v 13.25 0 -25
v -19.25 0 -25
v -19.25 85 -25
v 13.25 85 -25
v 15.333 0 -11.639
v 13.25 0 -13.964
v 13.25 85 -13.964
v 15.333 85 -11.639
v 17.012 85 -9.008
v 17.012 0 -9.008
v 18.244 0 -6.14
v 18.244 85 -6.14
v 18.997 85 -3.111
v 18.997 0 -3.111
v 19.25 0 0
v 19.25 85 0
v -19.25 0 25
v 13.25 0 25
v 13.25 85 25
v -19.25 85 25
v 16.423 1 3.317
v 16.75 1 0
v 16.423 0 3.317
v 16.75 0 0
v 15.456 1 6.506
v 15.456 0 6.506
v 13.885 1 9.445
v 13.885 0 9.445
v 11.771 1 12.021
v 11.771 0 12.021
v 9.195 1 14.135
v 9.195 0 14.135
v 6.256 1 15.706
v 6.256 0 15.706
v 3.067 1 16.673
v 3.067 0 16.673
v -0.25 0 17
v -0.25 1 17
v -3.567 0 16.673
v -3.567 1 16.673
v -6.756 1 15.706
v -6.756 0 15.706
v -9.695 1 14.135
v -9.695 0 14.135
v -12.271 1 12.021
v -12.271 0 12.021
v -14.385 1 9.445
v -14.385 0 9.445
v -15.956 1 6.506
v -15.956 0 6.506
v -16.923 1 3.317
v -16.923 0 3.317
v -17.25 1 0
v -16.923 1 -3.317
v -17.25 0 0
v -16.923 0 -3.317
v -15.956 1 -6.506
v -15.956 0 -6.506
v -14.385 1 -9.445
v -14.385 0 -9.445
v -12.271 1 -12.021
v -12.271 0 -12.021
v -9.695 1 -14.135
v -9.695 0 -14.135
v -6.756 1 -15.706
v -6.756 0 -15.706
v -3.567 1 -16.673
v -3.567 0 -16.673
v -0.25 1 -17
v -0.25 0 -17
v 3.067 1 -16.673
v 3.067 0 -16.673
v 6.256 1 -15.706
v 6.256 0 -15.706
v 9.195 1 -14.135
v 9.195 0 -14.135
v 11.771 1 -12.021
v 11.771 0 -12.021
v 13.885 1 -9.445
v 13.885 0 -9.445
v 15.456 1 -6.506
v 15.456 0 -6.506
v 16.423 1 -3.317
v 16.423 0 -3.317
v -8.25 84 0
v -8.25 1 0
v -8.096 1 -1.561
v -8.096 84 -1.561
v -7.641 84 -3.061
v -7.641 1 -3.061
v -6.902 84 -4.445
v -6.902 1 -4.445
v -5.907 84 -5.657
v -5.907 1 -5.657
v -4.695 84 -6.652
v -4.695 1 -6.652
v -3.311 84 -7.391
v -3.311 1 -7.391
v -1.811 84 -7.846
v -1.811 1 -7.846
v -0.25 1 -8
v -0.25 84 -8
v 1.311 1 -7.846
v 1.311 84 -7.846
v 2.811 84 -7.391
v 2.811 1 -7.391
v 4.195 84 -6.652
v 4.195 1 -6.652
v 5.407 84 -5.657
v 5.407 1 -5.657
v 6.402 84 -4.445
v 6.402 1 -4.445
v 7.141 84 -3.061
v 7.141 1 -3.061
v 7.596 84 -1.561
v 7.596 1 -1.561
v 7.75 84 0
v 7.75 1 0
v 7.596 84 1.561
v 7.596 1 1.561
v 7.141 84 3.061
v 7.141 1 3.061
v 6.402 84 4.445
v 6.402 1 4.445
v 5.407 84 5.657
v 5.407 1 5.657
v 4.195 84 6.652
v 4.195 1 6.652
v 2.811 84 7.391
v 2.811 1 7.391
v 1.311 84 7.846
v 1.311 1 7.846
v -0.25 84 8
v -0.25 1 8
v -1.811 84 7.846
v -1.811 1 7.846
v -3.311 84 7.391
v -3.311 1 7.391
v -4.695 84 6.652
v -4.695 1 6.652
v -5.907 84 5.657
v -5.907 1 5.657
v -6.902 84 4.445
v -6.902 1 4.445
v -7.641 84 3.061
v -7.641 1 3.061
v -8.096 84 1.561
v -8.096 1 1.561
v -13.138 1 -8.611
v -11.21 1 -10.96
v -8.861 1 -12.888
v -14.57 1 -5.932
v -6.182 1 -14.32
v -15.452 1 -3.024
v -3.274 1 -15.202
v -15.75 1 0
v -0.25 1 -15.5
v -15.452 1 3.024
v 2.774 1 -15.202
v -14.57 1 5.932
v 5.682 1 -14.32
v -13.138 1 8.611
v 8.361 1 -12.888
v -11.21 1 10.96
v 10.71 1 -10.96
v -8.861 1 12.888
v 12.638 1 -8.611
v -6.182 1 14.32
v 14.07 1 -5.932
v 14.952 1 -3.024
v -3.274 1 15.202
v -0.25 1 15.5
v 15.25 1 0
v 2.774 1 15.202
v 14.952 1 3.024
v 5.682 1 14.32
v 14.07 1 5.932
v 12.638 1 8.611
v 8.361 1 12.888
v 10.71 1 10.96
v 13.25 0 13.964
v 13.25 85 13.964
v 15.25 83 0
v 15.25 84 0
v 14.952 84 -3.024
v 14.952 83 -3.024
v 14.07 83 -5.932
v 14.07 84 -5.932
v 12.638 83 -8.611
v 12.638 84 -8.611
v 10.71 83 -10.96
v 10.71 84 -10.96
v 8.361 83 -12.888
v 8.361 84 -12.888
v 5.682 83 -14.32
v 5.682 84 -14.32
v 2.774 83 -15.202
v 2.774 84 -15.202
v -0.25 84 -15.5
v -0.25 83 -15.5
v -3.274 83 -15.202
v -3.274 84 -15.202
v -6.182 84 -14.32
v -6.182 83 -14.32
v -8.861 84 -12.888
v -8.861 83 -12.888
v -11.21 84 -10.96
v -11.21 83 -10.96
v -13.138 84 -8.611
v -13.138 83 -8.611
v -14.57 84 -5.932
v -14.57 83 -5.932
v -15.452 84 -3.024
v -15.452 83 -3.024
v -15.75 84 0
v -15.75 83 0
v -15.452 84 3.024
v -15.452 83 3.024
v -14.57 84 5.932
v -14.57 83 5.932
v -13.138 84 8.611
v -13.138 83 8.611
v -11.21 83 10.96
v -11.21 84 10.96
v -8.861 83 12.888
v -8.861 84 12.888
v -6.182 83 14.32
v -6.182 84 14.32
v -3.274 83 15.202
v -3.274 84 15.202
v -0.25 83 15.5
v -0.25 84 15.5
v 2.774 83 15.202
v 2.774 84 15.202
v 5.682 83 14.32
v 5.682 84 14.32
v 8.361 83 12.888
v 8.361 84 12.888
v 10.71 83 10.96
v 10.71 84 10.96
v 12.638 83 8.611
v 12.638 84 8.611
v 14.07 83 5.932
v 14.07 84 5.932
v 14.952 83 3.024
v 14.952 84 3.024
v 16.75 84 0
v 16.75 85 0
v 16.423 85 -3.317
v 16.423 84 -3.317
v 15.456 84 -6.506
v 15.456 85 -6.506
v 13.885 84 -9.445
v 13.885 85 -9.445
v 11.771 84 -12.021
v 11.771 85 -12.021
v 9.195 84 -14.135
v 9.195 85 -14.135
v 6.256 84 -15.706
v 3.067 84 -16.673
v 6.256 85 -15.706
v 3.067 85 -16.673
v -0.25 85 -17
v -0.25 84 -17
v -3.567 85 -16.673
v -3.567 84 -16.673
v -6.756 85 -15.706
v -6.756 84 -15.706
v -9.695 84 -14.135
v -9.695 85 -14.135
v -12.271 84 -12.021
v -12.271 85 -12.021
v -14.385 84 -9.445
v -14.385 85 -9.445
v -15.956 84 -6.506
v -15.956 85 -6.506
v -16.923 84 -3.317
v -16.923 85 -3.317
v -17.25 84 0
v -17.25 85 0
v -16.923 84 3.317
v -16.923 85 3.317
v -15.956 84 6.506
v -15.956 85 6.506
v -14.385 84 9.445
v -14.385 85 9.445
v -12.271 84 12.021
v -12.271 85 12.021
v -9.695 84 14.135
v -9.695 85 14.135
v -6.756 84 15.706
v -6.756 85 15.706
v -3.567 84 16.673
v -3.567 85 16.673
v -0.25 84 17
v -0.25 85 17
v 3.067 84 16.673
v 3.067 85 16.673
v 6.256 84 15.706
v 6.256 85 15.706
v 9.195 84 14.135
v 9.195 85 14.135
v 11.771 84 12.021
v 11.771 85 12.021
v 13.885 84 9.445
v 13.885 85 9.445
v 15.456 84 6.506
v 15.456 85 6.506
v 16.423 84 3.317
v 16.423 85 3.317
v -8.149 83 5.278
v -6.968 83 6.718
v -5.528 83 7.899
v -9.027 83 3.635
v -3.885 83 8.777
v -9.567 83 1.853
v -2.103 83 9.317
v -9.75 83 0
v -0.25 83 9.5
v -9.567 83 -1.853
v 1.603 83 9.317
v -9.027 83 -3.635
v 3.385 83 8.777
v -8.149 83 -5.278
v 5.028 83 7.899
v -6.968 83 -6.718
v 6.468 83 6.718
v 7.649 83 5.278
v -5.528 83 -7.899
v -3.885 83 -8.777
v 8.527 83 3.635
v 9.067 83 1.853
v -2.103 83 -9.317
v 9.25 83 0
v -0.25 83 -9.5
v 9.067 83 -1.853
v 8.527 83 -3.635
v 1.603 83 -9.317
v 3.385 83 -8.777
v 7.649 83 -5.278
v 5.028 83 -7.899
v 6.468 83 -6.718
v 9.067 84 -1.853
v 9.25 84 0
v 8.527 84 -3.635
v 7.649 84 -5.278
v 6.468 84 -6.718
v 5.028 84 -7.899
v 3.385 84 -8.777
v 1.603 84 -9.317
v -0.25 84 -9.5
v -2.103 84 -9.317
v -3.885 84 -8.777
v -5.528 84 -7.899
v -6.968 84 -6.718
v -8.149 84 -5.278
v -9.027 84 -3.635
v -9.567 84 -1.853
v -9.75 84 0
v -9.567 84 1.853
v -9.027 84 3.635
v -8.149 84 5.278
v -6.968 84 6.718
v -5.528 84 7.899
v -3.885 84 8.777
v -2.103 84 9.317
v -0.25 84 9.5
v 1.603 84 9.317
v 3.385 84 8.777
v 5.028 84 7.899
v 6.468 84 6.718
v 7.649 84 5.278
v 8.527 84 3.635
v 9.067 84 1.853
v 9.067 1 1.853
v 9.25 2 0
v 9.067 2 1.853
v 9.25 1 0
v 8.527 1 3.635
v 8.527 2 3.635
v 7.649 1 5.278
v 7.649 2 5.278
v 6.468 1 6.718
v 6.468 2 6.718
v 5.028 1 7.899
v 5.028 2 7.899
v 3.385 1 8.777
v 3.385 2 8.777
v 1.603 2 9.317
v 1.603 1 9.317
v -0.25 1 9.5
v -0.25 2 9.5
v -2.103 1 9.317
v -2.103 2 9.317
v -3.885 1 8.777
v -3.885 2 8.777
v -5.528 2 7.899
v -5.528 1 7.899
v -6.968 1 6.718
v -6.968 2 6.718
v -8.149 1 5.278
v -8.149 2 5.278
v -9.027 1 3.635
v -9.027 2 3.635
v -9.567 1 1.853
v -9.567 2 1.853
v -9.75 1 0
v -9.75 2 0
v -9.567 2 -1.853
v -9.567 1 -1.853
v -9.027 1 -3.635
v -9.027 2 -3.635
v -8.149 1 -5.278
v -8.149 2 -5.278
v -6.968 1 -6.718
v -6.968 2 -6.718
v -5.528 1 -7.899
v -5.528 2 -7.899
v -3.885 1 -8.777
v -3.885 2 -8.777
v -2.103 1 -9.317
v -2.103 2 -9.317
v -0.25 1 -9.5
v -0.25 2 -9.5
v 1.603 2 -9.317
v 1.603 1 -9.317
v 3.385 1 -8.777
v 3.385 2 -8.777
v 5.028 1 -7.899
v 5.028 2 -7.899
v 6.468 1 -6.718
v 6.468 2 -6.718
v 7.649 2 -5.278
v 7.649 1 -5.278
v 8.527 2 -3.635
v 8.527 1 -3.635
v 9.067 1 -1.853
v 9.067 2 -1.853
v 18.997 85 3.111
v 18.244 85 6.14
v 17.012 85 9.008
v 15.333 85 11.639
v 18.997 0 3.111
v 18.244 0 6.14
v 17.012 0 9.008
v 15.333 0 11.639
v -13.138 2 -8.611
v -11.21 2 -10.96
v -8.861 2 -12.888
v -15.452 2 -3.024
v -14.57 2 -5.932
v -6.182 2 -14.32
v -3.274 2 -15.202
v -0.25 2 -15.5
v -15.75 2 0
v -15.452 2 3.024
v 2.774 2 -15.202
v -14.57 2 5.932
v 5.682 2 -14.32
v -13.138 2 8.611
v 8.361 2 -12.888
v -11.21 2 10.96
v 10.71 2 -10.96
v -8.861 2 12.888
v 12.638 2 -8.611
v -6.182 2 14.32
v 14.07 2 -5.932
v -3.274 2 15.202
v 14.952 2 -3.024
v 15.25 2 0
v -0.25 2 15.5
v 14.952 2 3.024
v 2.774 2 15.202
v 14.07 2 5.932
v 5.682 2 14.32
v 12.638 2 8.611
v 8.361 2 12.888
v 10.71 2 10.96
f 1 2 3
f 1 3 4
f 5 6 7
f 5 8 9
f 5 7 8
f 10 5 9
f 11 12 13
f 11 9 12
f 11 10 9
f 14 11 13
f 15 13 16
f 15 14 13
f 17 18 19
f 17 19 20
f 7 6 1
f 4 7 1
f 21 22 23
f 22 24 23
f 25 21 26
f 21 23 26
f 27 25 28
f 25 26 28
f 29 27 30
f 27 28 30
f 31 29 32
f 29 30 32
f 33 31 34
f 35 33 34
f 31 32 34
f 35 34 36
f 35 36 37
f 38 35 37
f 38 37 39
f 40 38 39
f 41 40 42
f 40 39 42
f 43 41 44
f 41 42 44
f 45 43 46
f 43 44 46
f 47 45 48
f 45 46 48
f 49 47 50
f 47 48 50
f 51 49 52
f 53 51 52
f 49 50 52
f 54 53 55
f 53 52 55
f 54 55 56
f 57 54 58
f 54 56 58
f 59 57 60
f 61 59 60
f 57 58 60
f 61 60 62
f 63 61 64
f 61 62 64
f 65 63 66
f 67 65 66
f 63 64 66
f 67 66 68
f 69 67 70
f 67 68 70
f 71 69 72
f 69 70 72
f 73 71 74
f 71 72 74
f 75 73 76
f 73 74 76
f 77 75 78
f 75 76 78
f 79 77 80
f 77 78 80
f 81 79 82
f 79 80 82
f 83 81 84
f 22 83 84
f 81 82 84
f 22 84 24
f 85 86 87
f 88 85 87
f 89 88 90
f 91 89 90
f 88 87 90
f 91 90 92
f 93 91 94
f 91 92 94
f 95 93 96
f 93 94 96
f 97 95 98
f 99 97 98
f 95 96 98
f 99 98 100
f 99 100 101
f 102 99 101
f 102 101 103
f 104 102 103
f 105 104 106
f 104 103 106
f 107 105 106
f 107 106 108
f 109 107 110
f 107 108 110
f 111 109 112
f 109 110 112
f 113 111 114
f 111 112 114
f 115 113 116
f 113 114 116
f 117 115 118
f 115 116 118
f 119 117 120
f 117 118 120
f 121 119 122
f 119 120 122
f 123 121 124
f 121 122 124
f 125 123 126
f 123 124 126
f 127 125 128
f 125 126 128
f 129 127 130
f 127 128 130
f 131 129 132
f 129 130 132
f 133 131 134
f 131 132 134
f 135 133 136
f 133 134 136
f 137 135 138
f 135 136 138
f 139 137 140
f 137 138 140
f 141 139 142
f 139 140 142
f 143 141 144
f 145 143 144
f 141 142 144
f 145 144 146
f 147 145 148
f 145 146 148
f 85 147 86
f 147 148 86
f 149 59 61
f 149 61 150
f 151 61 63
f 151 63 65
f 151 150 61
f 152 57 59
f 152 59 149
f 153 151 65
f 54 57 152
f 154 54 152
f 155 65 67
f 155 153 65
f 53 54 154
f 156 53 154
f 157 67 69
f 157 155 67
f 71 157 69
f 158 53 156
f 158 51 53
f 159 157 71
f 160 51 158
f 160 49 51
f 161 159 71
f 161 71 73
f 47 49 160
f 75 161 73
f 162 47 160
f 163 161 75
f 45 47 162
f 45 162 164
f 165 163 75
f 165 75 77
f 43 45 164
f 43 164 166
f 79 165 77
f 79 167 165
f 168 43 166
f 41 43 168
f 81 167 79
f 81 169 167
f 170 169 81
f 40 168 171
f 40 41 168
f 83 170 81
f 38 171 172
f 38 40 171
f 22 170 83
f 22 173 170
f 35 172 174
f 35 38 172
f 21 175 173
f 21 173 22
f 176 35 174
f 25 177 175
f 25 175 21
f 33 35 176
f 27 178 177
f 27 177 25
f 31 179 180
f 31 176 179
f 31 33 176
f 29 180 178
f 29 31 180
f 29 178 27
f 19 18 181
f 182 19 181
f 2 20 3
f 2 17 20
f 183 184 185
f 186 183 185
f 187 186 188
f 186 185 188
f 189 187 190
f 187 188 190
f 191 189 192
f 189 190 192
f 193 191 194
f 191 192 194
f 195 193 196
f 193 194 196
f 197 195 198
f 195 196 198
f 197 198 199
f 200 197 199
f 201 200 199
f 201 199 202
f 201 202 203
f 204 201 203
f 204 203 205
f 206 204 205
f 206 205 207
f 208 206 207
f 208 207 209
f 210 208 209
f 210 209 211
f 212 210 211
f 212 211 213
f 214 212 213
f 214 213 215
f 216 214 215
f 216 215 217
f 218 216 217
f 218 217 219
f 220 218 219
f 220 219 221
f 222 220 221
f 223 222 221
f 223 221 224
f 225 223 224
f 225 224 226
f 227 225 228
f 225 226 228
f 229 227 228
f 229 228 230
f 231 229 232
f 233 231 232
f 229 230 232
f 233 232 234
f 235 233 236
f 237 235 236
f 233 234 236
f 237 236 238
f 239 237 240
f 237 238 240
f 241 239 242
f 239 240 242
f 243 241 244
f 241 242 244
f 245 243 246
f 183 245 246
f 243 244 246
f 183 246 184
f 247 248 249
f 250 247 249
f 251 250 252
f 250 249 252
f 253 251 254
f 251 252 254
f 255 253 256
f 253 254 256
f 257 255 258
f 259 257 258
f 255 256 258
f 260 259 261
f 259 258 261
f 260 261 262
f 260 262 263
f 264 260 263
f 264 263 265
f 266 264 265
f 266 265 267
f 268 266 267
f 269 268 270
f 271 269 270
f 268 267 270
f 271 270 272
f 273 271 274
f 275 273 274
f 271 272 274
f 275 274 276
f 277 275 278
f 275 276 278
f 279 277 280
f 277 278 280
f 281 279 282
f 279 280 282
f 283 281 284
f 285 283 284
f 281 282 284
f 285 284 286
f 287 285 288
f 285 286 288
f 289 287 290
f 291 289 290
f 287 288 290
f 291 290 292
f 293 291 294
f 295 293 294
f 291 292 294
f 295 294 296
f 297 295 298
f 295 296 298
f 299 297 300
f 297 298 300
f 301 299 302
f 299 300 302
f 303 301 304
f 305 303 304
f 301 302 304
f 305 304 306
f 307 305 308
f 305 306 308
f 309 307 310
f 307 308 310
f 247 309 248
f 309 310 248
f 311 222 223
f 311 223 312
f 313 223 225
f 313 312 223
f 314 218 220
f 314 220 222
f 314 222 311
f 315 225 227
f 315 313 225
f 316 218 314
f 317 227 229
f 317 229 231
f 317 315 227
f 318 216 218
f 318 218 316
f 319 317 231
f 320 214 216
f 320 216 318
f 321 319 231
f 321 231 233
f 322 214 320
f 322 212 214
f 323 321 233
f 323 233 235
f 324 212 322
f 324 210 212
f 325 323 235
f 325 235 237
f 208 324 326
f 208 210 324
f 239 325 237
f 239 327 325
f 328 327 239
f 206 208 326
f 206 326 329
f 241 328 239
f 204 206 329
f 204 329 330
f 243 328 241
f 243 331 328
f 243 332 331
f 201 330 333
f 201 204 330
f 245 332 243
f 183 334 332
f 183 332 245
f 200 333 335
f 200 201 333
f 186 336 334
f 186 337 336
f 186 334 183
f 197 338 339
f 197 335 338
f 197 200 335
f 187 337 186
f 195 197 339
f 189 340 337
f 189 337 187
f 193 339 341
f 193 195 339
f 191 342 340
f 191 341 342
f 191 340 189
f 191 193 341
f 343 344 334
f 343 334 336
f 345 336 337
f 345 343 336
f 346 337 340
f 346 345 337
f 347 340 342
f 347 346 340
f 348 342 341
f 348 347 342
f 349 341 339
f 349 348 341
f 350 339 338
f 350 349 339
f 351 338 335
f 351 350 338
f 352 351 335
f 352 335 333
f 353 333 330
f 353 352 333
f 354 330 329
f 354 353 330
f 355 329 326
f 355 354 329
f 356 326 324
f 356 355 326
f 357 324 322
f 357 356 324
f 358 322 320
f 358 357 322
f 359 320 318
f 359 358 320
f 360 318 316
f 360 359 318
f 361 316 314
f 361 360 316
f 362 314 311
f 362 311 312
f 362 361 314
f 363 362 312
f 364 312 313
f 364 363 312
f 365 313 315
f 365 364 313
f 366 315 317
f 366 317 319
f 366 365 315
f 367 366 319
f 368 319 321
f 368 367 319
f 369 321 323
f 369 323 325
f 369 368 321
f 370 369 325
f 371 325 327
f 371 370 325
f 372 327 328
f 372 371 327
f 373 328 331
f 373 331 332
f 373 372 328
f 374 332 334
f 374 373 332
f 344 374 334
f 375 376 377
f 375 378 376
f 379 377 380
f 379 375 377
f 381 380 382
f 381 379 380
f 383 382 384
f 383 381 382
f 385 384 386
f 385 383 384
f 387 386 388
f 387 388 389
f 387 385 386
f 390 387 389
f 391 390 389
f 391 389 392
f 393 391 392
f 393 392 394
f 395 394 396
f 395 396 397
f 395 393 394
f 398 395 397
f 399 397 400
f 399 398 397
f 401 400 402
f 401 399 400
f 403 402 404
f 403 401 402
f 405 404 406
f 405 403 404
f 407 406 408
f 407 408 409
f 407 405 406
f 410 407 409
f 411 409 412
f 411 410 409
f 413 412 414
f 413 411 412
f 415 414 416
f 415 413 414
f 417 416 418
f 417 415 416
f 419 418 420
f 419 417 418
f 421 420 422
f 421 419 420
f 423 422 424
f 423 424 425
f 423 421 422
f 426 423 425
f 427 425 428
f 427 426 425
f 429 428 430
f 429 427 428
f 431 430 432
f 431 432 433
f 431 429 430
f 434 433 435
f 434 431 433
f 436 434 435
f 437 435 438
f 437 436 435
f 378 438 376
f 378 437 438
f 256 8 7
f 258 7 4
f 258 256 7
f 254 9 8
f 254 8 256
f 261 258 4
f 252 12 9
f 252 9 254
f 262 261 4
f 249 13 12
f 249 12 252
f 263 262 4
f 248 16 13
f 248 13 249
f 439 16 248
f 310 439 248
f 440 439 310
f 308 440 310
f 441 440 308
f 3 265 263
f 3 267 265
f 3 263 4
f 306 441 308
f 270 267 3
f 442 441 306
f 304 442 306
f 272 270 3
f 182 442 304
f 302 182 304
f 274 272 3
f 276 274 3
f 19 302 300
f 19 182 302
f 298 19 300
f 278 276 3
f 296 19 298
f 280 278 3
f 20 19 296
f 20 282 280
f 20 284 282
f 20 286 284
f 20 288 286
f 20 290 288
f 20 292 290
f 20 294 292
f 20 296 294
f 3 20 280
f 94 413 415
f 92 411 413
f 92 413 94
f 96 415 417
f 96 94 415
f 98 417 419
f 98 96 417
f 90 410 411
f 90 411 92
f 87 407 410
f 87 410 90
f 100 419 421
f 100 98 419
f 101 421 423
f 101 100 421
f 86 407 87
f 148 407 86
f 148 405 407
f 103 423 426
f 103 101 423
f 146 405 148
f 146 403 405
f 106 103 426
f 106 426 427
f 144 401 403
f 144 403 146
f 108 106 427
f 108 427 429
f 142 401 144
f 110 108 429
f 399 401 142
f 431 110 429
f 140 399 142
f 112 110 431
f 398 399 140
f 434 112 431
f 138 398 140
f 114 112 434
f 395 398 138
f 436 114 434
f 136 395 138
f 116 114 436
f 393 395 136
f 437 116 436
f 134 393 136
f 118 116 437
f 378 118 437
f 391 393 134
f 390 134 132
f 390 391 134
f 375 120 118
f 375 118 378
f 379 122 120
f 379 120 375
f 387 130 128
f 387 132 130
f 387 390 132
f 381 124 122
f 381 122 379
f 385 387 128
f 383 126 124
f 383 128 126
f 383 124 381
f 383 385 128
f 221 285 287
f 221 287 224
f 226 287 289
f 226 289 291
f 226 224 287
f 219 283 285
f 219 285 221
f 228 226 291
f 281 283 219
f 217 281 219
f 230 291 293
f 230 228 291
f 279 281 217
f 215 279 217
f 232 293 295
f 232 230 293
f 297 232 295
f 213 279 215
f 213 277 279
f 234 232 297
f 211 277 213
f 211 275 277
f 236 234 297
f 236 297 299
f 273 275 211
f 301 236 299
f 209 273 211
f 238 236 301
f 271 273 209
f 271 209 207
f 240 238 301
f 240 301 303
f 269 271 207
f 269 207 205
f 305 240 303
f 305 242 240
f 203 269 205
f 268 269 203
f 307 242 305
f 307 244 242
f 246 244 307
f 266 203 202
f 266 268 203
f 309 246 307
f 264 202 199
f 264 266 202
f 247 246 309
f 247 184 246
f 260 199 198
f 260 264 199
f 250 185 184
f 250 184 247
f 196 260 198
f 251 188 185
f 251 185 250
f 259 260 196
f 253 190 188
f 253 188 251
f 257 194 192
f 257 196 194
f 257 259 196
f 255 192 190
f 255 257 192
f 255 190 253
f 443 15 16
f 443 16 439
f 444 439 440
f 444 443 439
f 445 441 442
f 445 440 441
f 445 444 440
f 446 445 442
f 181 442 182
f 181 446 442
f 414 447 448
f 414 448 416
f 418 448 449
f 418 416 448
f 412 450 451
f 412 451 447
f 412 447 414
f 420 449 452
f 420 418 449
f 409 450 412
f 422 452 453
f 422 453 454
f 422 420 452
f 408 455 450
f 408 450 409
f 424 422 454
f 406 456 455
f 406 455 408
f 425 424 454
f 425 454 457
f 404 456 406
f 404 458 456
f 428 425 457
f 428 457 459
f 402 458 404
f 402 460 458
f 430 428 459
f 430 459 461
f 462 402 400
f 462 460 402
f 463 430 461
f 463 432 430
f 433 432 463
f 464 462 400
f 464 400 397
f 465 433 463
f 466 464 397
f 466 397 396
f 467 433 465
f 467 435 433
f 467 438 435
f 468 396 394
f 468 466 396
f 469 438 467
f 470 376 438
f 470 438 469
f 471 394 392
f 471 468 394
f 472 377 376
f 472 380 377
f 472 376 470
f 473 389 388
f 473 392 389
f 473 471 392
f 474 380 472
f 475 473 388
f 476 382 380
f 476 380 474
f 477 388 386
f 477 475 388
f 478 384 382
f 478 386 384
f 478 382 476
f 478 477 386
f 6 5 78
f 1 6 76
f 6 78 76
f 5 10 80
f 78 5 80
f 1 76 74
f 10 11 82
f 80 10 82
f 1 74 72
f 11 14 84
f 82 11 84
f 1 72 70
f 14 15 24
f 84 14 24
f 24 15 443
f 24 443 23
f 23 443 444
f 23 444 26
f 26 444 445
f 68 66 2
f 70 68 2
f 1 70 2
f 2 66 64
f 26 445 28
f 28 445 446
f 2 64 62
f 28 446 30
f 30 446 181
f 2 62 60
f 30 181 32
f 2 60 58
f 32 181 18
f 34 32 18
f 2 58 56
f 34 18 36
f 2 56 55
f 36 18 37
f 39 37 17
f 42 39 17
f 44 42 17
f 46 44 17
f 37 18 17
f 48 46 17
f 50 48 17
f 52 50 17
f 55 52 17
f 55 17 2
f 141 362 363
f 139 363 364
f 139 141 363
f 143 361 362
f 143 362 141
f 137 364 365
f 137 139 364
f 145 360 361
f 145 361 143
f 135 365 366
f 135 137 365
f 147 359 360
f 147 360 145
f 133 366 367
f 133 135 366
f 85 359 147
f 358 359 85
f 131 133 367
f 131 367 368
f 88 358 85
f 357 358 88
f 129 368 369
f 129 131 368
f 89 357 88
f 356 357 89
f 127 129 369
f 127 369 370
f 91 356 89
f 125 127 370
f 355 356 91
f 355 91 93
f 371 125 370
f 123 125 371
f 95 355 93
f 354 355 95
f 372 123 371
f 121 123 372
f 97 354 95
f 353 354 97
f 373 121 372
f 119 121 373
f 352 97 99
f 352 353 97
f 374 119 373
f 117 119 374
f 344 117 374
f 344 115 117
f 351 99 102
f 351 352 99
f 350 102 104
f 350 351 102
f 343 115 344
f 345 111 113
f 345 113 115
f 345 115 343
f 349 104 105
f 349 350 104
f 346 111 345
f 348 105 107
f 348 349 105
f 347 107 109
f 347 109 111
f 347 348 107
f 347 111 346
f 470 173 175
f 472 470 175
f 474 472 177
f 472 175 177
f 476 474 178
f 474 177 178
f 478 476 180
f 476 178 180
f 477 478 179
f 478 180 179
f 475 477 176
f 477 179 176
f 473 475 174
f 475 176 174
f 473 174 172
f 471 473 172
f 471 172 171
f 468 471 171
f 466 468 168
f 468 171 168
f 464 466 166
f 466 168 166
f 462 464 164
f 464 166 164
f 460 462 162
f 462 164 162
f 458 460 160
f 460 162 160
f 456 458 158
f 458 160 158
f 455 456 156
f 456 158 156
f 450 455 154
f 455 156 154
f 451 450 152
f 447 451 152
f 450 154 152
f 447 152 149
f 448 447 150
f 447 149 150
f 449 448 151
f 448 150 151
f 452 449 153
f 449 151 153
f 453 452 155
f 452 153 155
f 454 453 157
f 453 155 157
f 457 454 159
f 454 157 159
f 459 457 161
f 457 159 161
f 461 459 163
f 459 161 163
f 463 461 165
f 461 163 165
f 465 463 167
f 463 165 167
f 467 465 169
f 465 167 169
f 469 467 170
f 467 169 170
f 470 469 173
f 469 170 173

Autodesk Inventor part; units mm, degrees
ref_plane "YZ Plane" through (0, 0, 0) normal (1, 0, 0) x (0, 1, 0)
ref_plane "XZ Plane" through (0, 0, 0) normal (0, 1, 0) x (-1, 0, 0)
ref_plane "XY Plane" through (0, 0, 0) normal (0, 0, 1) x (1, 0, 0)
sketch "Szkic1" plane through (0, 0, 0) normal (0, 1, 0) x (-1, 0, 0)
  line L0 (-13.25, 25) -> (19.25, 25)
  line L1 (19.25, 25) -> (19.25, -25)
  line L2 (19.25, -25) -> (-13.25, -25)
  line L3 (-19.25, 25) -> (19.25, -25) construction
  line L4 (19.25, 25) -> (-19.25, -25) construction
  line L5 (19.25, 0) -> (38.5, 0) construction
  line L6 (19.25, 0) -> (0.25, 0)
  line L7 (19.25, 0) -> (38.25, 0) construction
  circle A0 centre (0.25, 0) radius 8
  line L8 (19.25, 25) -> (-13.25, 25)
  line L9 (19.25, 25) -> (51.75, 25) construction
  arc A1 (-19.25, 0) -> (-13.25, -13.9642) centre (0, 0) ccw
  arc A2 (-13.25, 13.9642) -> (-19.25, 0) centre (0, 0) ccw
  line L10 (-13.25, 25) -> (-13.25, 13.9642)
  line L11 (-13.25, -13.9642) -> (-13.25, -25)
  point P0 (0, 0)
  dimension "d1" = 50
  dimension "d4" = 19
  dimension "d5" = 180
  dimension "d6" = 16
  dimension "d7" = 32.5
  dimension "d8" = 180
extrude "Wyciągnięcie proste1" add sketch "Szkic1" along normal blind 85
sketch "Szkic2" plane through (0, 0, 0) normal (0, -1, 0) x (1, 0, 0)
  circle A0 centre (-0.25, 0) radius 8 projected
  circle A1 centre (-0.25, 0) radius 9.5
  circle A2 centre (-0.25, 0) radius 17
  circle A3 centre (-0.25, 0) radius 15.5
  point P0 (0, 0)
  dimension "d11" = 19
  dimension "d12" = 34
  dimension "d13" = 31
extrude "Wyciągnięcie proste2" cut sketch "Szkic2" against normal blind 1
sketch "Szkic3" plane through (-0.25, 0, 0) normal (0, -1, 0) x (1, 0, 0)
  circle A0 centre (0, 0) radius 9.5 projected
  circle A1 centre (0, 0) radius 15.5 projected
  point P0 (0.25, 0)
extrude "Wyciągnięcie proste3" cut sketch "Szkic3" against normal blind 2
sketch "Szkic4" plane through (0, 85, 0) normal (0, 1, 0) x (1, 0, 0)
  circle A0 centre (-0.25, 0) radius 8
  circle A1 centre (-0.25, 0) radius 9.5
  circle A2 centre (-0.25, 0) radius 17
  circle A3 centre (-0.25, 0) radius 15.5
  point P0 (0, 0)
  point P1 (0, 0)
  dimension "d18" = 19
  dimension "d19" = 34
  dimension "d20" = 31
extrude "Wyciągnięcie proste4" cut sketch "Szkic4" against normal blind 1
sketch "Szkic5" plane through (-0.25, 85, 0) normal (0, 1, 0) x (1, 0, 0)
  circle A0 centre (0, 0) radius 9.5 projected
  circle A1 centre (0, 0) radius 15.5 projected
  point P0 (0.25, 0)
extrude "Wyciągnięcie proste5" cut sketch "Szkic5" against normal blind 2
properties part number "Łożysko liniowe w obudowie SMAG16UU-L"
